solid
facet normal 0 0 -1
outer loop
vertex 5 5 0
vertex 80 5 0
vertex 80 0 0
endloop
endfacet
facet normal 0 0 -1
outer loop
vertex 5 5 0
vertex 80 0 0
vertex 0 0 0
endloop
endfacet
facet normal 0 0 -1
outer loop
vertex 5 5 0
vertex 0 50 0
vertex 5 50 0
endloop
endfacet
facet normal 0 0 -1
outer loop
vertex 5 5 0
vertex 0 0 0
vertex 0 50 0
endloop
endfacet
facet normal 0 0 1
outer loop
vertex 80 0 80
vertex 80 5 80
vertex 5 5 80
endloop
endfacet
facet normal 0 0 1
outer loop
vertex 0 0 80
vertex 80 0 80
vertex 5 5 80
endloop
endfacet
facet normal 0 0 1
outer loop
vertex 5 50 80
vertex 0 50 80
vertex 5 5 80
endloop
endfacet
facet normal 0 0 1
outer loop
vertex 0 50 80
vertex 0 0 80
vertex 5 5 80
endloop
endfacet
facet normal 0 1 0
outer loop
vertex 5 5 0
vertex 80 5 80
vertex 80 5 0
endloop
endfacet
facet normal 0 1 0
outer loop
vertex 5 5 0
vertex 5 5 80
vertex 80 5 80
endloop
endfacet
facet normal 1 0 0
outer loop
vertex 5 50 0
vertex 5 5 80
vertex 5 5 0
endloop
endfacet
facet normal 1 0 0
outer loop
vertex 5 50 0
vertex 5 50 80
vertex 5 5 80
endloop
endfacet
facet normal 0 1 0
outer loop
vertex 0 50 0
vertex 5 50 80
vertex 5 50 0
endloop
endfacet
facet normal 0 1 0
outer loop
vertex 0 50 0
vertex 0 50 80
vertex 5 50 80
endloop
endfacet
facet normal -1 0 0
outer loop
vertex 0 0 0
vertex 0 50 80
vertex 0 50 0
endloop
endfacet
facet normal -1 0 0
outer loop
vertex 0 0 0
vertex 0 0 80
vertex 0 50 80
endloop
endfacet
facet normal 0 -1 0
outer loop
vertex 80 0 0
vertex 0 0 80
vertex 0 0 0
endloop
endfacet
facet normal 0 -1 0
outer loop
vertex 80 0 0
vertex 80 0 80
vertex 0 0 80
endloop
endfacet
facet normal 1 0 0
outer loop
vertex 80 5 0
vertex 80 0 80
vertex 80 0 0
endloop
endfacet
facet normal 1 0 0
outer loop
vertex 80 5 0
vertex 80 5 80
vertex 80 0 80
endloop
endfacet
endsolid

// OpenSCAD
$fn = 32;

// ----------------------------------------------------------------------
// Structural section: angle 80 x 50 mm
// ----------------------------------------------------------------------

// --- parameters (mm) ---
sec_w = 80;               // leg width, X
sec_h = 50;               // leg height, Y
flange_t = 5;             // leg thickness
plate_t = 80;             // cut length, Z (extrusion height)
fit_tol = 0.1;            // declared fit tolerance (prompt contract)
free_tol = 0.3;           // declared free tolerance (prompt contract)

profile = [[0, 0], [80, 0], [80, 5], [5, 5], [5, 50], [0, 50]];  // primary outline, 6 points, counter clockwise

// --- the one profile operation ---
linear_extrude(height = plate_t) polygon(points = profile);
